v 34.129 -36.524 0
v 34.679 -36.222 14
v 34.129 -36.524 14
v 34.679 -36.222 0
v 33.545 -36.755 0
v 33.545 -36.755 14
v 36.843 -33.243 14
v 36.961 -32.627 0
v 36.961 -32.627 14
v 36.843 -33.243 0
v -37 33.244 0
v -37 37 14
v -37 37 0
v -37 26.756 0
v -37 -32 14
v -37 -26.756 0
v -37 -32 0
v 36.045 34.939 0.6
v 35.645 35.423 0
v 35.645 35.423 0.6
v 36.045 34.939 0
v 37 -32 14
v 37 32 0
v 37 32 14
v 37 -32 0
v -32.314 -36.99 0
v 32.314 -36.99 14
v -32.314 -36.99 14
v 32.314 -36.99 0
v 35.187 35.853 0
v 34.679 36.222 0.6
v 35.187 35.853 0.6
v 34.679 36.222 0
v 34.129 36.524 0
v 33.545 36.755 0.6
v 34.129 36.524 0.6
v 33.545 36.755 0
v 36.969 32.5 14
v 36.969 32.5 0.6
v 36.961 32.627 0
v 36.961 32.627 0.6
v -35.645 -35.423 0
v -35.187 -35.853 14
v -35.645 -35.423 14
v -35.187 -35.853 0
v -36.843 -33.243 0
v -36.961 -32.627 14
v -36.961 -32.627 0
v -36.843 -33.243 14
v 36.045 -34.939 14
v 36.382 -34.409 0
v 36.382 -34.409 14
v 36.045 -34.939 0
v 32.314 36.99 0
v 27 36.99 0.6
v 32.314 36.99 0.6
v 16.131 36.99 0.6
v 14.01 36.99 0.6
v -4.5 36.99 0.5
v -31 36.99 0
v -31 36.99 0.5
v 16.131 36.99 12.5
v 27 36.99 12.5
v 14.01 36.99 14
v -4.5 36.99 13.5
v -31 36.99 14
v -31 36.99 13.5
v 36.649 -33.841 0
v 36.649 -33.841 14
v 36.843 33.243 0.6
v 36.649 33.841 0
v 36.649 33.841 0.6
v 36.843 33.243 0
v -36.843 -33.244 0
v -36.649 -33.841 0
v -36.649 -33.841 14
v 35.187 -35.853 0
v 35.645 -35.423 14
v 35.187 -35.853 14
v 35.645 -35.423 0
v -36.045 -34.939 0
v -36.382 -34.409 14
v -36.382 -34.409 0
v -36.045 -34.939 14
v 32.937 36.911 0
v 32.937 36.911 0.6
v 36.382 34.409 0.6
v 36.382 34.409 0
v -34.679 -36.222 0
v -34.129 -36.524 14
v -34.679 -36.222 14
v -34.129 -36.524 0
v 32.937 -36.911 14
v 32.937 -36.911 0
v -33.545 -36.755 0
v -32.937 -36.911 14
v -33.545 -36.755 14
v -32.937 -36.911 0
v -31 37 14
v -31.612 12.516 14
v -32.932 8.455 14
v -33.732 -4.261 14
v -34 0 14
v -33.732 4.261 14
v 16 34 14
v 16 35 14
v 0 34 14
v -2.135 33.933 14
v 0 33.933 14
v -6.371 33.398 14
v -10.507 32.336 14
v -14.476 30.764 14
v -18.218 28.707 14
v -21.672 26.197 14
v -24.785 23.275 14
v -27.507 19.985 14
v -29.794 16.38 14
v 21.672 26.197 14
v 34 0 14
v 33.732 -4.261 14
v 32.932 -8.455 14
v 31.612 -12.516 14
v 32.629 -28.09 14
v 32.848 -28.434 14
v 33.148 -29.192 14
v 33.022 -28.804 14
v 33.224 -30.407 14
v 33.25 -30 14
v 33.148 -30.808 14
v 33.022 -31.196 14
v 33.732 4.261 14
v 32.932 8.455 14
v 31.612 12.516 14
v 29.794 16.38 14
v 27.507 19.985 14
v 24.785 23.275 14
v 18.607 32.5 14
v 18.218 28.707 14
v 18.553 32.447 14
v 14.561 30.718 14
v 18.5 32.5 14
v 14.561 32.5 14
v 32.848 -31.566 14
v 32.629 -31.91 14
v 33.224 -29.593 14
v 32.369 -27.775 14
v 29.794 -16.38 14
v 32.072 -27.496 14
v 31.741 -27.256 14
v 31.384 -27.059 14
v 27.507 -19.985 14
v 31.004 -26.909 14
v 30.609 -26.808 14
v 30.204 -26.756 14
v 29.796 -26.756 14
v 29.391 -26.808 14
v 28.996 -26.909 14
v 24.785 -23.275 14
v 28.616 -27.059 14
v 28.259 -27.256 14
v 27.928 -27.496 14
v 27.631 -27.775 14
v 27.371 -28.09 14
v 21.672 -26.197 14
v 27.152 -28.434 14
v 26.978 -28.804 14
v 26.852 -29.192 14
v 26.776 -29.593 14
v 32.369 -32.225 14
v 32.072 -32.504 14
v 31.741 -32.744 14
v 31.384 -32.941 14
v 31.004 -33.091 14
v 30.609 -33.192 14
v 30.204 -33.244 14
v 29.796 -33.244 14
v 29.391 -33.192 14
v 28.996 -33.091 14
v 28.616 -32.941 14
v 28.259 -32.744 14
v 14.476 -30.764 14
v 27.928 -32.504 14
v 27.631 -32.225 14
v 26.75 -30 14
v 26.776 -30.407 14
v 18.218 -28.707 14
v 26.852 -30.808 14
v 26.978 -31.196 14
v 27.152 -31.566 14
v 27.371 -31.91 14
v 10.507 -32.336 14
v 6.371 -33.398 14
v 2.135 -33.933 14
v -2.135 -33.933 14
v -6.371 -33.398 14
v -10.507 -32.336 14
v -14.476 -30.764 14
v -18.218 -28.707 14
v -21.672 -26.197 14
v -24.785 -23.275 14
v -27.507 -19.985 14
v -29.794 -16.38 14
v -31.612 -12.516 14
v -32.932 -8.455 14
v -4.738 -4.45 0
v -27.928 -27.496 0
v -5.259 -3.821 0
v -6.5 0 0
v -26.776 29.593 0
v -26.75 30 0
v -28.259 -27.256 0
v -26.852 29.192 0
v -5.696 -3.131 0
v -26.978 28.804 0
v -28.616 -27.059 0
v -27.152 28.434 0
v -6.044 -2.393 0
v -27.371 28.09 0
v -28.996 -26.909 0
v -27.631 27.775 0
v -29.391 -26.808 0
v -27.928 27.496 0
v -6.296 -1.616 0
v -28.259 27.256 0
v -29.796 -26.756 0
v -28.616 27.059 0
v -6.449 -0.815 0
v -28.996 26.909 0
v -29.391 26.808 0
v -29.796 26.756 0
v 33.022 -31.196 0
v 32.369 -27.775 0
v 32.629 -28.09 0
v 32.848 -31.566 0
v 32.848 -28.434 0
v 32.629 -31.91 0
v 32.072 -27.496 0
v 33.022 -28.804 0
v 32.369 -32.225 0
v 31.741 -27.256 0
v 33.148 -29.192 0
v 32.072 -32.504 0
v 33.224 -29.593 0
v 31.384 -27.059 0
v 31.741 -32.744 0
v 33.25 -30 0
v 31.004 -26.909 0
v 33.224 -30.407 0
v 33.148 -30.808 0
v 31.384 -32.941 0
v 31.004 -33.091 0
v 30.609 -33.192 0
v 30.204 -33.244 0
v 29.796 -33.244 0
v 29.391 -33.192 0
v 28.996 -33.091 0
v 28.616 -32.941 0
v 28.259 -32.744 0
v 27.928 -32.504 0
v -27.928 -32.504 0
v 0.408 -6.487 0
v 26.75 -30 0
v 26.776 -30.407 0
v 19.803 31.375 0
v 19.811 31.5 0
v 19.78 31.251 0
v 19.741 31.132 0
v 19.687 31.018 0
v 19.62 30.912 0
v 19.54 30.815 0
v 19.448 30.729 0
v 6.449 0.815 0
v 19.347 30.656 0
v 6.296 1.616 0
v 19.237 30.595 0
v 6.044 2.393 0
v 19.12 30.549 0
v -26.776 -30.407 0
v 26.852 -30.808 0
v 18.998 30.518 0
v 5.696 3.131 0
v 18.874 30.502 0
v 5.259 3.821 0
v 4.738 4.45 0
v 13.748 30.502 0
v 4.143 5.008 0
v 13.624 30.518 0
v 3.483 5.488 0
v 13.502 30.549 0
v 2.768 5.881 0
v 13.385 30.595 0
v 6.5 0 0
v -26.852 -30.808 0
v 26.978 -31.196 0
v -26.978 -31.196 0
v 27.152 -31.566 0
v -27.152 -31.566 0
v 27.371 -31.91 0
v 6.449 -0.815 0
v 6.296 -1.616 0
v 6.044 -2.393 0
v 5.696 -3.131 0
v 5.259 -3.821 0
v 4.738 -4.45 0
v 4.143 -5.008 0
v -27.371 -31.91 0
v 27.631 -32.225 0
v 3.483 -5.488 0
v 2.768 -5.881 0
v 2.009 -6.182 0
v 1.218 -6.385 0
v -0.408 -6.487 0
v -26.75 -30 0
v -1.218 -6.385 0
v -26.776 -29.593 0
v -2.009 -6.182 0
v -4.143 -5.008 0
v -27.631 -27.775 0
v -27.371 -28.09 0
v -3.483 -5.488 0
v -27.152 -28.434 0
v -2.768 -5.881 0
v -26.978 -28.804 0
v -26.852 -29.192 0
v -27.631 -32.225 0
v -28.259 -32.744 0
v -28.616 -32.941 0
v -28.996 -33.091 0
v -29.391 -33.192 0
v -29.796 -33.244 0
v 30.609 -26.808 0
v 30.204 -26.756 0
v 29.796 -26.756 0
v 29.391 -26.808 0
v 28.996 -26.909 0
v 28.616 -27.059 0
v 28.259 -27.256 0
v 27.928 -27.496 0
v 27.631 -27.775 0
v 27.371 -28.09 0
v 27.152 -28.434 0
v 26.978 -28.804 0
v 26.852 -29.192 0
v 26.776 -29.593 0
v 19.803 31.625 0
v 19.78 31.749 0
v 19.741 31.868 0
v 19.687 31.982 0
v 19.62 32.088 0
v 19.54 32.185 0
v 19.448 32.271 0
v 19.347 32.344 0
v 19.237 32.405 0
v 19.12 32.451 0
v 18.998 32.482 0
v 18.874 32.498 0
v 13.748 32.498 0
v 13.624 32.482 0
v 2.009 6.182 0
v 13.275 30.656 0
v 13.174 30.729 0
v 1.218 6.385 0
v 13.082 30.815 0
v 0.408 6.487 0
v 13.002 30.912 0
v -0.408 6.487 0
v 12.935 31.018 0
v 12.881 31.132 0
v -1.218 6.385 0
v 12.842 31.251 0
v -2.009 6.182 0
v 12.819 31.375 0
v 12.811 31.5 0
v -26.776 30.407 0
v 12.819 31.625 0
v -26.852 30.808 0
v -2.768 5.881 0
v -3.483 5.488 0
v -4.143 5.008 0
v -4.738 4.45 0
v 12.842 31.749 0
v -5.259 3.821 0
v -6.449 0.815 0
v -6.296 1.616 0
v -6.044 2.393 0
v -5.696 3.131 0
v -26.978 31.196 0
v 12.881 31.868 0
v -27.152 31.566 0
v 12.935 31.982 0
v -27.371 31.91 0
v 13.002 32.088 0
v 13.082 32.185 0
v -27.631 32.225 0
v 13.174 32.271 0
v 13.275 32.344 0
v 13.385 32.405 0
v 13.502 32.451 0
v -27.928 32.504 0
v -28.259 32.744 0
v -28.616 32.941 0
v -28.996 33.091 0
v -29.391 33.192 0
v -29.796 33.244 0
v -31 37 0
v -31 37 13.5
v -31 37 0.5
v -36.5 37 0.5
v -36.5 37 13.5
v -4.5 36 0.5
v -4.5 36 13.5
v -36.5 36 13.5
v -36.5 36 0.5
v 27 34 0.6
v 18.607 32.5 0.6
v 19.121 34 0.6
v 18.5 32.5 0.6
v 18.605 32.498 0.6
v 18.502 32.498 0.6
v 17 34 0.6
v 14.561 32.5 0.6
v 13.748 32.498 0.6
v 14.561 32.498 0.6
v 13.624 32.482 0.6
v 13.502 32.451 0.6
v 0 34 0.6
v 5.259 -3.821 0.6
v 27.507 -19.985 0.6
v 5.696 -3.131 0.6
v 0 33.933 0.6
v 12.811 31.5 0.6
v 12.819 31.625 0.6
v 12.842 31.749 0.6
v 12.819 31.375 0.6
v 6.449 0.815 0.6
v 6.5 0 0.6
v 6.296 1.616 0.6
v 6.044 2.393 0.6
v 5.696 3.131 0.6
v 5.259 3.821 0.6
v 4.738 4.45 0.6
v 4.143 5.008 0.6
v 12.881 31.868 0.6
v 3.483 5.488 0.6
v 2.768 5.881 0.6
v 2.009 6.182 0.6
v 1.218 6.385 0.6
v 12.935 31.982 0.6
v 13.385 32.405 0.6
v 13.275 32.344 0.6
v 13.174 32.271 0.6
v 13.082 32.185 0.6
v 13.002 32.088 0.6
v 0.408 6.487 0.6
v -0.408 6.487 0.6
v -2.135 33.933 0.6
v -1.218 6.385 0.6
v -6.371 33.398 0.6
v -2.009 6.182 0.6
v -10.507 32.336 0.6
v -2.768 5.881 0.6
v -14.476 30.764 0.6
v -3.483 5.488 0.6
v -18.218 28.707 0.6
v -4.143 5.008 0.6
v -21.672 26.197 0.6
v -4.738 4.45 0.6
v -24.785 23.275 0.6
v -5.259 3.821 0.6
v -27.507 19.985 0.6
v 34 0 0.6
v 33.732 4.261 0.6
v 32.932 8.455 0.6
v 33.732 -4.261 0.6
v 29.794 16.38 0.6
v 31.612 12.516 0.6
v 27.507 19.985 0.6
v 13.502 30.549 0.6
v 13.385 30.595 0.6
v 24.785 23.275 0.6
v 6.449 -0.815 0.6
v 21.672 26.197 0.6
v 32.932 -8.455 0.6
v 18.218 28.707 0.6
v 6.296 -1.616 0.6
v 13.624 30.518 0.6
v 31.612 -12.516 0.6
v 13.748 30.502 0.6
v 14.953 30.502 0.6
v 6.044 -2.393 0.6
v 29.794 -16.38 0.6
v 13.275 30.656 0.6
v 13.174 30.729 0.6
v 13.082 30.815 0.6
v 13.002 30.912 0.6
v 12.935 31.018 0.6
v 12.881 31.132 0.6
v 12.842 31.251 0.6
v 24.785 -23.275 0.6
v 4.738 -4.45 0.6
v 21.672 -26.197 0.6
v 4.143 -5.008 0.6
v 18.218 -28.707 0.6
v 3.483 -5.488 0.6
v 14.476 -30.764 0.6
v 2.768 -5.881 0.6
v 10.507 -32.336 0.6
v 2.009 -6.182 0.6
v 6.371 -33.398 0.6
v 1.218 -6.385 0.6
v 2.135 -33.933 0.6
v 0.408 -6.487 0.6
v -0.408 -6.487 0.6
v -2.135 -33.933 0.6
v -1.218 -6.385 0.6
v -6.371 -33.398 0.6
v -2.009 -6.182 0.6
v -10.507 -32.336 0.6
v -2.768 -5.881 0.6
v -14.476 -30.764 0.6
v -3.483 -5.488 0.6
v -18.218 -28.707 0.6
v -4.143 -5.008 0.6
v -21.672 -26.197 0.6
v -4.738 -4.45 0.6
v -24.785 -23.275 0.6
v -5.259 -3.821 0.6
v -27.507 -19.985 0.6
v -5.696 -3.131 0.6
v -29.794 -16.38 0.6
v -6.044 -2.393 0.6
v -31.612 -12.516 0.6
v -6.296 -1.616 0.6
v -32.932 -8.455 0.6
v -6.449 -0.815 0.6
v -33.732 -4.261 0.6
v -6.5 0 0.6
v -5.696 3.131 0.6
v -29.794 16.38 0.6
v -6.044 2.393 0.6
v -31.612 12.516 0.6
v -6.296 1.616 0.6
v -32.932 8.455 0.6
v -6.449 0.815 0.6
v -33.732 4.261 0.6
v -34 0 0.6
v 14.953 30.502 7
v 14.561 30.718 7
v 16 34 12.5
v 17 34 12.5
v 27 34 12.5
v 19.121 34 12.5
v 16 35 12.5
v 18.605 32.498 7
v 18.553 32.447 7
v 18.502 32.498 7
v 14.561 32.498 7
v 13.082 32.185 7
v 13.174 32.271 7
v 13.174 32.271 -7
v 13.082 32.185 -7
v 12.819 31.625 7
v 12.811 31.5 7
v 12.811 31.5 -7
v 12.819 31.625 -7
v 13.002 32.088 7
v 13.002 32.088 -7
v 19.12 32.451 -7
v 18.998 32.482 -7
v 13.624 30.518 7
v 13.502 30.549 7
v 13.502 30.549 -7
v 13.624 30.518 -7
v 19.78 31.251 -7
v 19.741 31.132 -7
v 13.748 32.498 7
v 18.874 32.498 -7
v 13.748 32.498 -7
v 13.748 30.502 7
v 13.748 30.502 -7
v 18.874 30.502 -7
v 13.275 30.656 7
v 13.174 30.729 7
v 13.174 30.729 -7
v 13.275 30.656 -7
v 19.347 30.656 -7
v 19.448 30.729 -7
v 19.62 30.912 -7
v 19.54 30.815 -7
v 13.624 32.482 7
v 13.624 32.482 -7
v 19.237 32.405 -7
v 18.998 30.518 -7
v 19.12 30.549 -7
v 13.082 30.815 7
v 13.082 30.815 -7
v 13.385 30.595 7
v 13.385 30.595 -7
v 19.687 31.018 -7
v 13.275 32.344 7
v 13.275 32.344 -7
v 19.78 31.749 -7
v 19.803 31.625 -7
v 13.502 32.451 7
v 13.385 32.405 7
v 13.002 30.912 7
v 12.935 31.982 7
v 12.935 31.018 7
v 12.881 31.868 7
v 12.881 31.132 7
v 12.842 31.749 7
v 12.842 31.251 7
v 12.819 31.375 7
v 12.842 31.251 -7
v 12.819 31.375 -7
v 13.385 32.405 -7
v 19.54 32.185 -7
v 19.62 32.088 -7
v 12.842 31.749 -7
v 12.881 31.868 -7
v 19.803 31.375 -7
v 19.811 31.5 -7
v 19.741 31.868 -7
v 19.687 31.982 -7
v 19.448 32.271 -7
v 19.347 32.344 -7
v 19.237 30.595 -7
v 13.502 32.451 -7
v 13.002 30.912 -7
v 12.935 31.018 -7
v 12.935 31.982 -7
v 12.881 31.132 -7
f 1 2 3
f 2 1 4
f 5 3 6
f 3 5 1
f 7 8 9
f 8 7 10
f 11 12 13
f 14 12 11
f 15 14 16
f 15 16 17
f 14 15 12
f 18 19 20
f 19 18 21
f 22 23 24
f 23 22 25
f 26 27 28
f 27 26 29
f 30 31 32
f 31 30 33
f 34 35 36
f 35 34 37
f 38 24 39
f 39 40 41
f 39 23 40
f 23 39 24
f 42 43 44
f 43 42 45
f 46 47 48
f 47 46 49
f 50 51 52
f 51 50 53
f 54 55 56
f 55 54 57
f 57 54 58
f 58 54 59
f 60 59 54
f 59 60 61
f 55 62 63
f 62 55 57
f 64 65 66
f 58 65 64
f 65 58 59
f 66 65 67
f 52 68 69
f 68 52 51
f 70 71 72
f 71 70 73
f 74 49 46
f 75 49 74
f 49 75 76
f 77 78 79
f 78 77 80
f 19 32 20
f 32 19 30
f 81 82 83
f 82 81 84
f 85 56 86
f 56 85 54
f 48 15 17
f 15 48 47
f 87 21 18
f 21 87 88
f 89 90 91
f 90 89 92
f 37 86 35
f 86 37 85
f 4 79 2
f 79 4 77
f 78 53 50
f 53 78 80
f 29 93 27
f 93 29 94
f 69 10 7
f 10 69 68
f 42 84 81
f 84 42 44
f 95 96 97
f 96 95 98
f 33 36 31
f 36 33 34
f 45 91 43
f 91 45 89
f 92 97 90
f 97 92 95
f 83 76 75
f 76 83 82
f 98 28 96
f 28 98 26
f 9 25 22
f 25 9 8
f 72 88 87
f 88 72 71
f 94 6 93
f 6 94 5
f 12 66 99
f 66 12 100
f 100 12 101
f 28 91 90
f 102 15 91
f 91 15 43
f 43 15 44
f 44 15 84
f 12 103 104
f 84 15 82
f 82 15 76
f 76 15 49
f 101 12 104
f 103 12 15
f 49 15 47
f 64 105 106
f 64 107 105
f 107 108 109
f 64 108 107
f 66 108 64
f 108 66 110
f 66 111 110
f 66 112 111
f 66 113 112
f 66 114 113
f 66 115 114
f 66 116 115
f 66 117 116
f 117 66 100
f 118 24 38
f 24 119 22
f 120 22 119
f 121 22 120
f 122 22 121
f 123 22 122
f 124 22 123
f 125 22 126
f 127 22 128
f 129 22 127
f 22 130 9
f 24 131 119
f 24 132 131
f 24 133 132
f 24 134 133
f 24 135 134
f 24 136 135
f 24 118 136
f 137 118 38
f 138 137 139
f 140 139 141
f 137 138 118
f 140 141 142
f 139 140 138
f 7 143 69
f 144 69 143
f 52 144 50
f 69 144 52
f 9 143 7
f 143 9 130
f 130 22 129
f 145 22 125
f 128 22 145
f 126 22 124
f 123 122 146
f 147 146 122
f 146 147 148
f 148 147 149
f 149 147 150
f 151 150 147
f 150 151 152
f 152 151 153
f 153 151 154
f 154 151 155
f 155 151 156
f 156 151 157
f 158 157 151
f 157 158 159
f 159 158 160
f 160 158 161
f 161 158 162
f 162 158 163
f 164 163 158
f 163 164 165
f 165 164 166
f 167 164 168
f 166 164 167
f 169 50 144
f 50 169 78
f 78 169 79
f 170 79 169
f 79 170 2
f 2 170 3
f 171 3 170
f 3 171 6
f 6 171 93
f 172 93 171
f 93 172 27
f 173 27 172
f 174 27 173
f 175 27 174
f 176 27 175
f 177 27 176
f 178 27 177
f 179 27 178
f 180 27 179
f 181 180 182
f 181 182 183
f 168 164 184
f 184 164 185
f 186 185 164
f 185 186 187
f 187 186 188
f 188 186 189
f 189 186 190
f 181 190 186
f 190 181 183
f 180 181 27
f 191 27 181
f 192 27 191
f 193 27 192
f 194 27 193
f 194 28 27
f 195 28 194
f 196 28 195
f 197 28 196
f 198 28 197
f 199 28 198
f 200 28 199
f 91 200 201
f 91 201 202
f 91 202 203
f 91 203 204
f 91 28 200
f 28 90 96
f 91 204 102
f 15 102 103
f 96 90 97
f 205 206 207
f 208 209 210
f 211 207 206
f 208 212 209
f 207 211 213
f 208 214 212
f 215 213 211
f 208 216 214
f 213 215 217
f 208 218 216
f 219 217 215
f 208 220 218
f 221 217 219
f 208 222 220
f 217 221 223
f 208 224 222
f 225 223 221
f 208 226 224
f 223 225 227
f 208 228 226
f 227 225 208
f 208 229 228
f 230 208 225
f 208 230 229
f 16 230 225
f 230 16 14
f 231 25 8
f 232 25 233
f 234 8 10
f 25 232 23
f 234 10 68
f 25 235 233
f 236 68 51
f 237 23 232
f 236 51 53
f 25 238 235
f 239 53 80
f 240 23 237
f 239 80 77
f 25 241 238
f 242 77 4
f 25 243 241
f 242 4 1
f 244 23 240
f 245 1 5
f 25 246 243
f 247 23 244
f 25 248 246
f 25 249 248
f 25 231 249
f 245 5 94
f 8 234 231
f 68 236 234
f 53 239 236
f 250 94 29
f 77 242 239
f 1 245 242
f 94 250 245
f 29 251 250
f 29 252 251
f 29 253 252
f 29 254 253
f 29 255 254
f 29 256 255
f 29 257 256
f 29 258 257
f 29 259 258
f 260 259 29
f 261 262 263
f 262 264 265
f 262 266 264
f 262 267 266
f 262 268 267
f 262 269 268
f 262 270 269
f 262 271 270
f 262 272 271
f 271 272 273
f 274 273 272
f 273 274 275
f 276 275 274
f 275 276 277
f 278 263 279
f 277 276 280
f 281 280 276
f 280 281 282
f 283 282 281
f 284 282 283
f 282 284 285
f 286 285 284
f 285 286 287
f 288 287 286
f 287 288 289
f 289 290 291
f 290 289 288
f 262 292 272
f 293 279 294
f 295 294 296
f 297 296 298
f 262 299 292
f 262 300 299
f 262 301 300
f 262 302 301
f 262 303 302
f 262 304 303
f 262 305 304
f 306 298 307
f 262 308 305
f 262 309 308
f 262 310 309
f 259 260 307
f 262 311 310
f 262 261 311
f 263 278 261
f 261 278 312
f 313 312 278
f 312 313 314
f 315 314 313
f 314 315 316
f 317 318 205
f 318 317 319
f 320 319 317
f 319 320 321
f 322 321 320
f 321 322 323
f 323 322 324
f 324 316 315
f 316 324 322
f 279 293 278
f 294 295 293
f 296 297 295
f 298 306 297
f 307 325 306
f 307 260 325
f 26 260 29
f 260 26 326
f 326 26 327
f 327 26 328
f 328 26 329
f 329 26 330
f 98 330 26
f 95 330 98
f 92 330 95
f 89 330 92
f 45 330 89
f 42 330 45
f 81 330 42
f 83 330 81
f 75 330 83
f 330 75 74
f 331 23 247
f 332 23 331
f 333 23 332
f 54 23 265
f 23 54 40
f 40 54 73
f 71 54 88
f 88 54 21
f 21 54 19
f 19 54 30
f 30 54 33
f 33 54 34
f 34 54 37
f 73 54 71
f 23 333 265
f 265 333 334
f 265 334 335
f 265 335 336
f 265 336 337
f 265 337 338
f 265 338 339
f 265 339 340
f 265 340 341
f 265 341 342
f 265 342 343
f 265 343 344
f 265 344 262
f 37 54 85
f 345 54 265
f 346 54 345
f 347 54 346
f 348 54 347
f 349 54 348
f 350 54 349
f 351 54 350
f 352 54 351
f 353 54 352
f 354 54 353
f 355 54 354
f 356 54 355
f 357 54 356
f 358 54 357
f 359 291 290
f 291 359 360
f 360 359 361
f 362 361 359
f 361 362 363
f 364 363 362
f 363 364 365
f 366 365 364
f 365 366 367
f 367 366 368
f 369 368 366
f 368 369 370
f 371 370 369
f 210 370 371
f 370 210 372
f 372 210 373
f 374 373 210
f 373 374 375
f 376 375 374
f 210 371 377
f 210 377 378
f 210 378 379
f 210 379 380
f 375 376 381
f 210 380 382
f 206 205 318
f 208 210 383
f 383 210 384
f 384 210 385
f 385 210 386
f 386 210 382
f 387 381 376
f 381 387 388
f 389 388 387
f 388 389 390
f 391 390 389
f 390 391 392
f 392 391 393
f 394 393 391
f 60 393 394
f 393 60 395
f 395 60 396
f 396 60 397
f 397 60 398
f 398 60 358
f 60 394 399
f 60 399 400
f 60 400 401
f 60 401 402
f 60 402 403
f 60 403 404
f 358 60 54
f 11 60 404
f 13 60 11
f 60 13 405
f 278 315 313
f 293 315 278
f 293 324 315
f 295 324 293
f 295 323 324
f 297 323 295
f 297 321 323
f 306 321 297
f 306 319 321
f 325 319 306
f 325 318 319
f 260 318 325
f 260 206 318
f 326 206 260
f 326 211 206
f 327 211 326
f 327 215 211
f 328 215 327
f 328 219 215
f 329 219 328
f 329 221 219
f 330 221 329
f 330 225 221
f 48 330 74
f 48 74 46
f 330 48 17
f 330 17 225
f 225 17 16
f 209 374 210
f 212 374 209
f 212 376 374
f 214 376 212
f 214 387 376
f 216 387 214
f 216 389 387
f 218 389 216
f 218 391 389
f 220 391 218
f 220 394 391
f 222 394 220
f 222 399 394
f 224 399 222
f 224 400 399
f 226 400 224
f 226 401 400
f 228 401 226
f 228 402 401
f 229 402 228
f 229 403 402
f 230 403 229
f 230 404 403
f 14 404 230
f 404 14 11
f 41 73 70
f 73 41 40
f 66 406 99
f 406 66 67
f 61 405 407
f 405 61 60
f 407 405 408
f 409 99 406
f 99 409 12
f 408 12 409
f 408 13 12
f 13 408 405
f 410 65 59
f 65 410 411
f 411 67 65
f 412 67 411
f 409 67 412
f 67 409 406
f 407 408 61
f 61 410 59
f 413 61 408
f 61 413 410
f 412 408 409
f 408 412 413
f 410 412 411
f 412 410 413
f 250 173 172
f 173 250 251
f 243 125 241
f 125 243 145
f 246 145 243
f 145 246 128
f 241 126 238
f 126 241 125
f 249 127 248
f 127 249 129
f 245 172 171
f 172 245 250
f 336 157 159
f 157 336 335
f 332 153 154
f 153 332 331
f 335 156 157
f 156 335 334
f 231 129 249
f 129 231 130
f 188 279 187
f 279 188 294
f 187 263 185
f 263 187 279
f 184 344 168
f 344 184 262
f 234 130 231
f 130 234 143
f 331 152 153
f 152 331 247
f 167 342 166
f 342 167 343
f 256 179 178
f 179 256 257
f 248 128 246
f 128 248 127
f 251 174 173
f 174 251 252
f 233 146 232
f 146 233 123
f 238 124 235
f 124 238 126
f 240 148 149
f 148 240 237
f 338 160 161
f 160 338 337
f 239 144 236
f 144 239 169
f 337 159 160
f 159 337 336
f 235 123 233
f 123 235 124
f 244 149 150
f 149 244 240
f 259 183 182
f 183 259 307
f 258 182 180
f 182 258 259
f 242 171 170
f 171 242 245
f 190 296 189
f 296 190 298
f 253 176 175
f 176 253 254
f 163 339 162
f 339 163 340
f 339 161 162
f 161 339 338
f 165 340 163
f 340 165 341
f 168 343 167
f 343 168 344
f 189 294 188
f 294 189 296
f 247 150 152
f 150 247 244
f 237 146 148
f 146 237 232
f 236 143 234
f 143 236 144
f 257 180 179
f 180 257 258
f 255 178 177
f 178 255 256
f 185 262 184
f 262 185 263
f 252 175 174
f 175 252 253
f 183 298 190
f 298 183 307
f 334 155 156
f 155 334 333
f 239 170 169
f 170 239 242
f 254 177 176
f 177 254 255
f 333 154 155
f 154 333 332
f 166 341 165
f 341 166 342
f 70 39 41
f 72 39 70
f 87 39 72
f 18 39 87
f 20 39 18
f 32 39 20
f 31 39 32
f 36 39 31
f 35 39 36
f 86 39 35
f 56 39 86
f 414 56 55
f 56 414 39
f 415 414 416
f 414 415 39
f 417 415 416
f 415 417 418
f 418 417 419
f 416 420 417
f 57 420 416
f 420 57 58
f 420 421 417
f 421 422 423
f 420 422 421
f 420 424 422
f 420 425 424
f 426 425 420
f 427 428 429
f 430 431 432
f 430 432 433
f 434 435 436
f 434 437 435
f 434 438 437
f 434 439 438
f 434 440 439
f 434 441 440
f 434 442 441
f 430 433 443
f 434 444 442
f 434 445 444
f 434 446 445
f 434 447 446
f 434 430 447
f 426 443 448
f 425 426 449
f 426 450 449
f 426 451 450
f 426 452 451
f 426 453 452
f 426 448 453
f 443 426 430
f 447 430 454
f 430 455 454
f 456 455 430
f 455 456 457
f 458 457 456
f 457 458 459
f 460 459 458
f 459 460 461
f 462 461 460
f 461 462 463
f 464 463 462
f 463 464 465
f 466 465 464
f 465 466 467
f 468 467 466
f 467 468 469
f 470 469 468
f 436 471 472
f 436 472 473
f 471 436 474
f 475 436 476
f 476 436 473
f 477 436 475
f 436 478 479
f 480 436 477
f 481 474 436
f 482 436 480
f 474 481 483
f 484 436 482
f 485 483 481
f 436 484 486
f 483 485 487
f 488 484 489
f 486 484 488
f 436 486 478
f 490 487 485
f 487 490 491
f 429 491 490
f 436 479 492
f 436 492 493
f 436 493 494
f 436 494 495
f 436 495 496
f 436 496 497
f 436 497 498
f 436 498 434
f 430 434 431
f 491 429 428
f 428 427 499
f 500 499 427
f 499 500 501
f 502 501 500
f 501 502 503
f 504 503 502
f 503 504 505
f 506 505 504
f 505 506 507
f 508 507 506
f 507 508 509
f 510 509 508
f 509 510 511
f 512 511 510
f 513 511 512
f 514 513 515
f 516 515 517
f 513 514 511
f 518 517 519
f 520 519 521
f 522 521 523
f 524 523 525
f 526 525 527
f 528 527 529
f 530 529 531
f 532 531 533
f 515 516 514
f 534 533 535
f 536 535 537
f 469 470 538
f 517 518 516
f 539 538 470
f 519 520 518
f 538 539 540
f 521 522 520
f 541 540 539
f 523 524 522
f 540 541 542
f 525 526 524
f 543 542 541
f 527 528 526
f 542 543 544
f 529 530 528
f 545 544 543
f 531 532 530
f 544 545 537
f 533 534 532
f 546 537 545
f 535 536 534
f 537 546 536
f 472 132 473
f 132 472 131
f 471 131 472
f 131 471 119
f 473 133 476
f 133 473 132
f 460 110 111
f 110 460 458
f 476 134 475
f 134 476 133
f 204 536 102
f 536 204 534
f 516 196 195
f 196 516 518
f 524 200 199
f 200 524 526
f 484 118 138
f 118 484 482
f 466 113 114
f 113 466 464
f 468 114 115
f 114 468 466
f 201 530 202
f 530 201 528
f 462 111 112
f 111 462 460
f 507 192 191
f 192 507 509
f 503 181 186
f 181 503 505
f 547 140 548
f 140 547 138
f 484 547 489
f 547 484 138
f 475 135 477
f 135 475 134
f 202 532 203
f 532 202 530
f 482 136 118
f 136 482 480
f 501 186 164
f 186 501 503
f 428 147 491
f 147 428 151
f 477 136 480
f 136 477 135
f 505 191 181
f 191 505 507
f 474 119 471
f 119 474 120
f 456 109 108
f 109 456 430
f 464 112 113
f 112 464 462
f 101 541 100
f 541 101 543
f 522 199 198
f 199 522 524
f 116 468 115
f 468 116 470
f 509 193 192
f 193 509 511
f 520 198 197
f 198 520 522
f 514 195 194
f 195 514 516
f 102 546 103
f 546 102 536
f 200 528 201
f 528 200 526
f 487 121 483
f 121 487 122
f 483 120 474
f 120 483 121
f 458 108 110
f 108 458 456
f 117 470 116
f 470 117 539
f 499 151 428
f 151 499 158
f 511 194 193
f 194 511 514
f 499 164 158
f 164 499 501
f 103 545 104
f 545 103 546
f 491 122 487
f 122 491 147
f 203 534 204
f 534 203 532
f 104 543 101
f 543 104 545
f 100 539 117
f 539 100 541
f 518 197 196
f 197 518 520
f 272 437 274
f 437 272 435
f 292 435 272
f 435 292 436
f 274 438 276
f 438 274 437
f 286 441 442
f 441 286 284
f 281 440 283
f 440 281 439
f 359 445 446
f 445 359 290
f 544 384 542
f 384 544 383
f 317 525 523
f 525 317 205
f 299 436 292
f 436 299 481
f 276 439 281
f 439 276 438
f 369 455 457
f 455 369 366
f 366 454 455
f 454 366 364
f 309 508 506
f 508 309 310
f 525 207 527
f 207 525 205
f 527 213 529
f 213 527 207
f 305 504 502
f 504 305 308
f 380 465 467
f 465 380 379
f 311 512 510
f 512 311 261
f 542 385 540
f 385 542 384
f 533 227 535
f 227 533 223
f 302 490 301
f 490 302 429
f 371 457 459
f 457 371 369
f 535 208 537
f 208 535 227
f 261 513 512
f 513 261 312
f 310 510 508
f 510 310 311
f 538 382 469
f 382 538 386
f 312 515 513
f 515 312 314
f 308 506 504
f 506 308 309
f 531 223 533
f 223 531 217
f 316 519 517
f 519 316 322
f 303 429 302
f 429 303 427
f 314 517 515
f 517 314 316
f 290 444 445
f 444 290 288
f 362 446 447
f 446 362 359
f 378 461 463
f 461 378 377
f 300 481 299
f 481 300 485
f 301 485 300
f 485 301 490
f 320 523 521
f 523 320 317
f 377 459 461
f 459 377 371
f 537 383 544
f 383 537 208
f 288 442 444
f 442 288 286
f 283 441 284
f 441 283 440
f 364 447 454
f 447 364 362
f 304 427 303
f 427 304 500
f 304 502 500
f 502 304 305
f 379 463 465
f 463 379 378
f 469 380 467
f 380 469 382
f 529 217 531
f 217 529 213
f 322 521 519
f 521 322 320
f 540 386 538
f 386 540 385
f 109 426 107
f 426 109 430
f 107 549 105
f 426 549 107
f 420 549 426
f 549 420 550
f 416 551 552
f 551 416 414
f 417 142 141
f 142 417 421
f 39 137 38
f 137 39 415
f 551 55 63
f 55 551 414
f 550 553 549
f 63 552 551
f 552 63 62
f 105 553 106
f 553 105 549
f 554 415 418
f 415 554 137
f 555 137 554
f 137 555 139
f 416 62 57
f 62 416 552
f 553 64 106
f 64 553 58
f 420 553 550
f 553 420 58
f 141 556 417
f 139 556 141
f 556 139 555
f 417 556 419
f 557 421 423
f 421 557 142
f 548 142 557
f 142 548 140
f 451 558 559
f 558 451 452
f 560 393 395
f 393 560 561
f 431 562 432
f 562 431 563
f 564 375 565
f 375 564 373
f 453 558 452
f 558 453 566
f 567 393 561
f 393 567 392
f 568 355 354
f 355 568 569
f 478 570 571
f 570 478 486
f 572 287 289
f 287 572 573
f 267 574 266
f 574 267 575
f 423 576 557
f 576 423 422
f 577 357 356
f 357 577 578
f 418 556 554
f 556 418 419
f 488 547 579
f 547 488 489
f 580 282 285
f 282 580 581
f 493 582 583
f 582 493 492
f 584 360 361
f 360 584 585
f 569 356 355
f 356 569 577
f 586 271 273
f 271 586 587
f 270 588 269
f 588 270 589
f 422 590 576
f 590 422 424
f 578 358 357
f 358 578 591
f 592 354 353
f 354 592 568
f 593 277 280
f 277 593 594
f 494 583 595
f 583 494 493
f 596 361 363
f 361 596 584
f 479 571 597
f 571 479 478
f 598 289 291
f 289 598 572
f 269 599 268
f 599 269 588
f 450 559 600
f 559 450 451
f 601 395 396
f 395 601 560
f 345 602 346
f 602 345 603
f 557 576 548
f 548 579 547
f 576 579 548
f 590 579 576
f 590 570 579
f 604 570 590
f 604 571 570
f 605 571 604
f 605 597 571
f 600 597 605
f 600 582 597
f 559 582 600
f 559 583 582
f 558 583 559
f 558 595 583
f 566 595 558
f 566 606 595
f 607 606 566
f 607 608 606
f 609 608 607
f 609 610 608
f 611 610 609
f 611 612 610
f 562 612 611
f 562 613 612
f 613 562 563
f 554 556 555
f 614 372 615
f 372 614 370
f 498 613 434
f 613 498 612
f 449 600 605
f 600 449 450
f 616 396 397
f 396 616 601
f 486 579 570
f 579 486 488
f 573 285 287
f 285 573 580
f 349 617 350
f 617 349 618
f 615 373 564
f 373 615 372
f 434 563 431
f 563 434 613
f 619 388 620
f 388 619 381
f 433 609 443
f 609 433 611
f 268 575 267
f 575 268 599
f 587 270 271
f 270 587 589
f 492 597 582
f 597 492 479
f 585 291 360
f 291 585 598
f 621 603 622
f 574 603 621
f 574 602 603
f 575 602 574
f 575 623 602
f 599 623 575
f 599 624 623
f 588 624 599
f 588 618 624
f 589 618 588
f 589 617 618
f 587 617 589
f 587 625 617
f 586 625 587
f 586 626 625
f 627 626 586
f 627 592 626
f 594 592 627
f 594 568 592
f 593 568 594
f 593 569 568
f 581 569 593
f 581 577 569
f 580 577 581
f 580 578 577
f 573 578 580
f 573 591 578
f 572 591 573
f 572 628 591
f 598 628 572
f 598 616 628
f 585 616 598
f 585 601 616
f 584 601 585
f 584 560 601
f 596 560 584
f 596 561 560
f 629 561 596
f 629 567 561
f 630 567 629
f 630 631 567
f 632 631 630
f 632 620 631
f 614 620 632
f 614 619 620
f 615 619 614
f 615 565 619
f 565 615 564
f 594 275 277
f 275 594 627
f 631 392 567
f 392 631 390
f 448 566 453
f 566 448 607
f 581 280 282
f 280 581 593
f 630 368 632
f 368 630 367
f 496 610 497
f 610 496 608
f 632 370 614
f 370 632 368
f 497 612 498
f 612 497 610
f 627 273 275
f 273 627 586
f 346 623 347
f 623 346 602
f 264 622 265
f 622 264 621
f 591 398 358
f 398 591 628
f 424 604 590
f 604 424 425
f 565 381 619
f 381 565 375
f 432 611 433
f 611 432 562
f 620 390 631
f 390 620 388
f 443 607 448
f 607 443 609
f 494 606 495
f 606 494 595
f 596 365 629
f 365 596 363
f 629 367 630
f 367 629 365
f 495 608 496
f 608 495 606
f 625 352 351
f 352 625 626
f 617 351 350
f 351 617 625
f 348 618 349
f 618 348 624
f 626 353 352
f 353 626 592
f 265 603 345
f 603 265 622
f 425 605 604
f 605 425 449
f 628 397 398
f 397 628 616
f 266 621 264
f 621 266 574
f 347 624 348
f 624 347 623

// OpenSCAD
$fn = 50;


union() {
	difference() {
		union() {
			hull() {
				translate(v = [-32.0000000000, 32.0000000000, 0]) {
					cylinder(h = 14, r = 5);
				}
				translate(v = [32.0000000000, 32.0000000000, 0]) {
					cylinder(h = 14, r = 5);
				}
				translate(v = [-32.0000000000, -32.0000000000, 0]) {
					cylinder(h = 14, r = 5);
				}
				translate(v = [32.0000000000, -32.0000000000, 0]) {
					cylinder(h = 14, r = 5);
				}
			}
			translate(v = [-37.0000000000, 31.0000000000, 0]) {
				cube(size = [6, 6, 14]);
			}
		}
		union() {
			translate(v = [-37.5000000000, -30.0000000000, -250.0000000000]) {
				rotate(a = [0, 0, 0]) {
					difference() {
						union() {
							hull() {
								translate(v = [7.5000000000, 0, 0]) {
									cylinder(h = 250, r = 3.2500000000, r1 = 3.2500000000, r2 = 3.2500000000);
								}
								translate(v = [-7.5000000000, 0, 0]) {
									cylinder(h = 250, r = 3.2500000000, r1 = 3.2500000000, r2 = 3.2500000000);
								}
							}
						}
						union();
					}
				}
			}
			translate(v = [-37.5000000000, 30.0000000000, -250.0000000000]) {
				rotate(a = [0, 0, 0]) {
					difference() {
						union() {
							hull() {
								translate(v = [7.5000000000, 0, 0]) {
									cylinder(h = 250, r = 3.2500000000, r1 = 3.2500000000, r2 = 3.2500000000);
								}
								translate(v = [-7.5000000000, 0, 0]) {
									cylinder(h = 250, r = 3.2500000000, r1 = 3.2500000000, r2 = 3.2500000000);
								}
							}
						}
						union();
					}
				}
			}
			translate(v = [-36.5000000000, 36.0000000000, 0.5000000000]) {
				cube(size = [32, 1, 13.0000000000]);
			}
			translate(v = [30.0000000000, -30.0000000000, 0]) {
				cylinder(h = 100, r = 3.2500000000);
			}
			translate(v = [0, 0, 0.6000000000]) {
				cylinder(h = 16.4000000000, r = 34.0000000000);
			}
			translate(v = [0, 0, -7.0000000000]) {
				cylinder(h = 14, r = 6.5000000000);
			}
			translate(v = [0.0000000000, 32.5000000000, 0.6000000000]) {
				cube(size = [37.0000000000, 1.5000000000, 16.4000000000]);
			}
			translate(v = [27.0000000000, 32.5000000000, 0.6000000000]) {
				cube(size = [10, 4.5000000000, 16.4000000000]);
			}
			translate(v = [16.0000000000, 32.5000000000, 12.5000000000]) {
				cube(size = [21, 4.5000000000, 1.5000000000]);
			}
			translate(v = [13.2500000000, 37.7500000000, 0.6000000000]) {
				rotate(a = [0, 0, -45]) {
					cube(size = [7.5000000000, 1.5000000000, 16.4000000000]);
				}
			}
			translate(v = [7.0610000000, 30.5000000000, 0.6000000000]) {
				cube(size = [7.5000000000, 2, 13.4000000000]);
			}
		}
	}
	union() {
		translate(v = [16.3110000000, 31.5000000000, -7.0000000000]) {
			rotate(a = [0, 0, 0]) {
				difference() {
					union() {
						#hull() {
							#translate(v = [2.5000000000, 0, 0]) {
								cylinder(h = 14, r = 1.0000000000, r1 = 1.0000000000, r2 = 1.0000000000);
							}
							#translate(v = [-2.5000000000, 0, 0]) {
								cylinder(h = 14, r = 1.0000000000, r1 = 1.0000000000, r2 = 1.0000000000);
							}
						}
					}
					union();
				}
			}
		}
	}
}
